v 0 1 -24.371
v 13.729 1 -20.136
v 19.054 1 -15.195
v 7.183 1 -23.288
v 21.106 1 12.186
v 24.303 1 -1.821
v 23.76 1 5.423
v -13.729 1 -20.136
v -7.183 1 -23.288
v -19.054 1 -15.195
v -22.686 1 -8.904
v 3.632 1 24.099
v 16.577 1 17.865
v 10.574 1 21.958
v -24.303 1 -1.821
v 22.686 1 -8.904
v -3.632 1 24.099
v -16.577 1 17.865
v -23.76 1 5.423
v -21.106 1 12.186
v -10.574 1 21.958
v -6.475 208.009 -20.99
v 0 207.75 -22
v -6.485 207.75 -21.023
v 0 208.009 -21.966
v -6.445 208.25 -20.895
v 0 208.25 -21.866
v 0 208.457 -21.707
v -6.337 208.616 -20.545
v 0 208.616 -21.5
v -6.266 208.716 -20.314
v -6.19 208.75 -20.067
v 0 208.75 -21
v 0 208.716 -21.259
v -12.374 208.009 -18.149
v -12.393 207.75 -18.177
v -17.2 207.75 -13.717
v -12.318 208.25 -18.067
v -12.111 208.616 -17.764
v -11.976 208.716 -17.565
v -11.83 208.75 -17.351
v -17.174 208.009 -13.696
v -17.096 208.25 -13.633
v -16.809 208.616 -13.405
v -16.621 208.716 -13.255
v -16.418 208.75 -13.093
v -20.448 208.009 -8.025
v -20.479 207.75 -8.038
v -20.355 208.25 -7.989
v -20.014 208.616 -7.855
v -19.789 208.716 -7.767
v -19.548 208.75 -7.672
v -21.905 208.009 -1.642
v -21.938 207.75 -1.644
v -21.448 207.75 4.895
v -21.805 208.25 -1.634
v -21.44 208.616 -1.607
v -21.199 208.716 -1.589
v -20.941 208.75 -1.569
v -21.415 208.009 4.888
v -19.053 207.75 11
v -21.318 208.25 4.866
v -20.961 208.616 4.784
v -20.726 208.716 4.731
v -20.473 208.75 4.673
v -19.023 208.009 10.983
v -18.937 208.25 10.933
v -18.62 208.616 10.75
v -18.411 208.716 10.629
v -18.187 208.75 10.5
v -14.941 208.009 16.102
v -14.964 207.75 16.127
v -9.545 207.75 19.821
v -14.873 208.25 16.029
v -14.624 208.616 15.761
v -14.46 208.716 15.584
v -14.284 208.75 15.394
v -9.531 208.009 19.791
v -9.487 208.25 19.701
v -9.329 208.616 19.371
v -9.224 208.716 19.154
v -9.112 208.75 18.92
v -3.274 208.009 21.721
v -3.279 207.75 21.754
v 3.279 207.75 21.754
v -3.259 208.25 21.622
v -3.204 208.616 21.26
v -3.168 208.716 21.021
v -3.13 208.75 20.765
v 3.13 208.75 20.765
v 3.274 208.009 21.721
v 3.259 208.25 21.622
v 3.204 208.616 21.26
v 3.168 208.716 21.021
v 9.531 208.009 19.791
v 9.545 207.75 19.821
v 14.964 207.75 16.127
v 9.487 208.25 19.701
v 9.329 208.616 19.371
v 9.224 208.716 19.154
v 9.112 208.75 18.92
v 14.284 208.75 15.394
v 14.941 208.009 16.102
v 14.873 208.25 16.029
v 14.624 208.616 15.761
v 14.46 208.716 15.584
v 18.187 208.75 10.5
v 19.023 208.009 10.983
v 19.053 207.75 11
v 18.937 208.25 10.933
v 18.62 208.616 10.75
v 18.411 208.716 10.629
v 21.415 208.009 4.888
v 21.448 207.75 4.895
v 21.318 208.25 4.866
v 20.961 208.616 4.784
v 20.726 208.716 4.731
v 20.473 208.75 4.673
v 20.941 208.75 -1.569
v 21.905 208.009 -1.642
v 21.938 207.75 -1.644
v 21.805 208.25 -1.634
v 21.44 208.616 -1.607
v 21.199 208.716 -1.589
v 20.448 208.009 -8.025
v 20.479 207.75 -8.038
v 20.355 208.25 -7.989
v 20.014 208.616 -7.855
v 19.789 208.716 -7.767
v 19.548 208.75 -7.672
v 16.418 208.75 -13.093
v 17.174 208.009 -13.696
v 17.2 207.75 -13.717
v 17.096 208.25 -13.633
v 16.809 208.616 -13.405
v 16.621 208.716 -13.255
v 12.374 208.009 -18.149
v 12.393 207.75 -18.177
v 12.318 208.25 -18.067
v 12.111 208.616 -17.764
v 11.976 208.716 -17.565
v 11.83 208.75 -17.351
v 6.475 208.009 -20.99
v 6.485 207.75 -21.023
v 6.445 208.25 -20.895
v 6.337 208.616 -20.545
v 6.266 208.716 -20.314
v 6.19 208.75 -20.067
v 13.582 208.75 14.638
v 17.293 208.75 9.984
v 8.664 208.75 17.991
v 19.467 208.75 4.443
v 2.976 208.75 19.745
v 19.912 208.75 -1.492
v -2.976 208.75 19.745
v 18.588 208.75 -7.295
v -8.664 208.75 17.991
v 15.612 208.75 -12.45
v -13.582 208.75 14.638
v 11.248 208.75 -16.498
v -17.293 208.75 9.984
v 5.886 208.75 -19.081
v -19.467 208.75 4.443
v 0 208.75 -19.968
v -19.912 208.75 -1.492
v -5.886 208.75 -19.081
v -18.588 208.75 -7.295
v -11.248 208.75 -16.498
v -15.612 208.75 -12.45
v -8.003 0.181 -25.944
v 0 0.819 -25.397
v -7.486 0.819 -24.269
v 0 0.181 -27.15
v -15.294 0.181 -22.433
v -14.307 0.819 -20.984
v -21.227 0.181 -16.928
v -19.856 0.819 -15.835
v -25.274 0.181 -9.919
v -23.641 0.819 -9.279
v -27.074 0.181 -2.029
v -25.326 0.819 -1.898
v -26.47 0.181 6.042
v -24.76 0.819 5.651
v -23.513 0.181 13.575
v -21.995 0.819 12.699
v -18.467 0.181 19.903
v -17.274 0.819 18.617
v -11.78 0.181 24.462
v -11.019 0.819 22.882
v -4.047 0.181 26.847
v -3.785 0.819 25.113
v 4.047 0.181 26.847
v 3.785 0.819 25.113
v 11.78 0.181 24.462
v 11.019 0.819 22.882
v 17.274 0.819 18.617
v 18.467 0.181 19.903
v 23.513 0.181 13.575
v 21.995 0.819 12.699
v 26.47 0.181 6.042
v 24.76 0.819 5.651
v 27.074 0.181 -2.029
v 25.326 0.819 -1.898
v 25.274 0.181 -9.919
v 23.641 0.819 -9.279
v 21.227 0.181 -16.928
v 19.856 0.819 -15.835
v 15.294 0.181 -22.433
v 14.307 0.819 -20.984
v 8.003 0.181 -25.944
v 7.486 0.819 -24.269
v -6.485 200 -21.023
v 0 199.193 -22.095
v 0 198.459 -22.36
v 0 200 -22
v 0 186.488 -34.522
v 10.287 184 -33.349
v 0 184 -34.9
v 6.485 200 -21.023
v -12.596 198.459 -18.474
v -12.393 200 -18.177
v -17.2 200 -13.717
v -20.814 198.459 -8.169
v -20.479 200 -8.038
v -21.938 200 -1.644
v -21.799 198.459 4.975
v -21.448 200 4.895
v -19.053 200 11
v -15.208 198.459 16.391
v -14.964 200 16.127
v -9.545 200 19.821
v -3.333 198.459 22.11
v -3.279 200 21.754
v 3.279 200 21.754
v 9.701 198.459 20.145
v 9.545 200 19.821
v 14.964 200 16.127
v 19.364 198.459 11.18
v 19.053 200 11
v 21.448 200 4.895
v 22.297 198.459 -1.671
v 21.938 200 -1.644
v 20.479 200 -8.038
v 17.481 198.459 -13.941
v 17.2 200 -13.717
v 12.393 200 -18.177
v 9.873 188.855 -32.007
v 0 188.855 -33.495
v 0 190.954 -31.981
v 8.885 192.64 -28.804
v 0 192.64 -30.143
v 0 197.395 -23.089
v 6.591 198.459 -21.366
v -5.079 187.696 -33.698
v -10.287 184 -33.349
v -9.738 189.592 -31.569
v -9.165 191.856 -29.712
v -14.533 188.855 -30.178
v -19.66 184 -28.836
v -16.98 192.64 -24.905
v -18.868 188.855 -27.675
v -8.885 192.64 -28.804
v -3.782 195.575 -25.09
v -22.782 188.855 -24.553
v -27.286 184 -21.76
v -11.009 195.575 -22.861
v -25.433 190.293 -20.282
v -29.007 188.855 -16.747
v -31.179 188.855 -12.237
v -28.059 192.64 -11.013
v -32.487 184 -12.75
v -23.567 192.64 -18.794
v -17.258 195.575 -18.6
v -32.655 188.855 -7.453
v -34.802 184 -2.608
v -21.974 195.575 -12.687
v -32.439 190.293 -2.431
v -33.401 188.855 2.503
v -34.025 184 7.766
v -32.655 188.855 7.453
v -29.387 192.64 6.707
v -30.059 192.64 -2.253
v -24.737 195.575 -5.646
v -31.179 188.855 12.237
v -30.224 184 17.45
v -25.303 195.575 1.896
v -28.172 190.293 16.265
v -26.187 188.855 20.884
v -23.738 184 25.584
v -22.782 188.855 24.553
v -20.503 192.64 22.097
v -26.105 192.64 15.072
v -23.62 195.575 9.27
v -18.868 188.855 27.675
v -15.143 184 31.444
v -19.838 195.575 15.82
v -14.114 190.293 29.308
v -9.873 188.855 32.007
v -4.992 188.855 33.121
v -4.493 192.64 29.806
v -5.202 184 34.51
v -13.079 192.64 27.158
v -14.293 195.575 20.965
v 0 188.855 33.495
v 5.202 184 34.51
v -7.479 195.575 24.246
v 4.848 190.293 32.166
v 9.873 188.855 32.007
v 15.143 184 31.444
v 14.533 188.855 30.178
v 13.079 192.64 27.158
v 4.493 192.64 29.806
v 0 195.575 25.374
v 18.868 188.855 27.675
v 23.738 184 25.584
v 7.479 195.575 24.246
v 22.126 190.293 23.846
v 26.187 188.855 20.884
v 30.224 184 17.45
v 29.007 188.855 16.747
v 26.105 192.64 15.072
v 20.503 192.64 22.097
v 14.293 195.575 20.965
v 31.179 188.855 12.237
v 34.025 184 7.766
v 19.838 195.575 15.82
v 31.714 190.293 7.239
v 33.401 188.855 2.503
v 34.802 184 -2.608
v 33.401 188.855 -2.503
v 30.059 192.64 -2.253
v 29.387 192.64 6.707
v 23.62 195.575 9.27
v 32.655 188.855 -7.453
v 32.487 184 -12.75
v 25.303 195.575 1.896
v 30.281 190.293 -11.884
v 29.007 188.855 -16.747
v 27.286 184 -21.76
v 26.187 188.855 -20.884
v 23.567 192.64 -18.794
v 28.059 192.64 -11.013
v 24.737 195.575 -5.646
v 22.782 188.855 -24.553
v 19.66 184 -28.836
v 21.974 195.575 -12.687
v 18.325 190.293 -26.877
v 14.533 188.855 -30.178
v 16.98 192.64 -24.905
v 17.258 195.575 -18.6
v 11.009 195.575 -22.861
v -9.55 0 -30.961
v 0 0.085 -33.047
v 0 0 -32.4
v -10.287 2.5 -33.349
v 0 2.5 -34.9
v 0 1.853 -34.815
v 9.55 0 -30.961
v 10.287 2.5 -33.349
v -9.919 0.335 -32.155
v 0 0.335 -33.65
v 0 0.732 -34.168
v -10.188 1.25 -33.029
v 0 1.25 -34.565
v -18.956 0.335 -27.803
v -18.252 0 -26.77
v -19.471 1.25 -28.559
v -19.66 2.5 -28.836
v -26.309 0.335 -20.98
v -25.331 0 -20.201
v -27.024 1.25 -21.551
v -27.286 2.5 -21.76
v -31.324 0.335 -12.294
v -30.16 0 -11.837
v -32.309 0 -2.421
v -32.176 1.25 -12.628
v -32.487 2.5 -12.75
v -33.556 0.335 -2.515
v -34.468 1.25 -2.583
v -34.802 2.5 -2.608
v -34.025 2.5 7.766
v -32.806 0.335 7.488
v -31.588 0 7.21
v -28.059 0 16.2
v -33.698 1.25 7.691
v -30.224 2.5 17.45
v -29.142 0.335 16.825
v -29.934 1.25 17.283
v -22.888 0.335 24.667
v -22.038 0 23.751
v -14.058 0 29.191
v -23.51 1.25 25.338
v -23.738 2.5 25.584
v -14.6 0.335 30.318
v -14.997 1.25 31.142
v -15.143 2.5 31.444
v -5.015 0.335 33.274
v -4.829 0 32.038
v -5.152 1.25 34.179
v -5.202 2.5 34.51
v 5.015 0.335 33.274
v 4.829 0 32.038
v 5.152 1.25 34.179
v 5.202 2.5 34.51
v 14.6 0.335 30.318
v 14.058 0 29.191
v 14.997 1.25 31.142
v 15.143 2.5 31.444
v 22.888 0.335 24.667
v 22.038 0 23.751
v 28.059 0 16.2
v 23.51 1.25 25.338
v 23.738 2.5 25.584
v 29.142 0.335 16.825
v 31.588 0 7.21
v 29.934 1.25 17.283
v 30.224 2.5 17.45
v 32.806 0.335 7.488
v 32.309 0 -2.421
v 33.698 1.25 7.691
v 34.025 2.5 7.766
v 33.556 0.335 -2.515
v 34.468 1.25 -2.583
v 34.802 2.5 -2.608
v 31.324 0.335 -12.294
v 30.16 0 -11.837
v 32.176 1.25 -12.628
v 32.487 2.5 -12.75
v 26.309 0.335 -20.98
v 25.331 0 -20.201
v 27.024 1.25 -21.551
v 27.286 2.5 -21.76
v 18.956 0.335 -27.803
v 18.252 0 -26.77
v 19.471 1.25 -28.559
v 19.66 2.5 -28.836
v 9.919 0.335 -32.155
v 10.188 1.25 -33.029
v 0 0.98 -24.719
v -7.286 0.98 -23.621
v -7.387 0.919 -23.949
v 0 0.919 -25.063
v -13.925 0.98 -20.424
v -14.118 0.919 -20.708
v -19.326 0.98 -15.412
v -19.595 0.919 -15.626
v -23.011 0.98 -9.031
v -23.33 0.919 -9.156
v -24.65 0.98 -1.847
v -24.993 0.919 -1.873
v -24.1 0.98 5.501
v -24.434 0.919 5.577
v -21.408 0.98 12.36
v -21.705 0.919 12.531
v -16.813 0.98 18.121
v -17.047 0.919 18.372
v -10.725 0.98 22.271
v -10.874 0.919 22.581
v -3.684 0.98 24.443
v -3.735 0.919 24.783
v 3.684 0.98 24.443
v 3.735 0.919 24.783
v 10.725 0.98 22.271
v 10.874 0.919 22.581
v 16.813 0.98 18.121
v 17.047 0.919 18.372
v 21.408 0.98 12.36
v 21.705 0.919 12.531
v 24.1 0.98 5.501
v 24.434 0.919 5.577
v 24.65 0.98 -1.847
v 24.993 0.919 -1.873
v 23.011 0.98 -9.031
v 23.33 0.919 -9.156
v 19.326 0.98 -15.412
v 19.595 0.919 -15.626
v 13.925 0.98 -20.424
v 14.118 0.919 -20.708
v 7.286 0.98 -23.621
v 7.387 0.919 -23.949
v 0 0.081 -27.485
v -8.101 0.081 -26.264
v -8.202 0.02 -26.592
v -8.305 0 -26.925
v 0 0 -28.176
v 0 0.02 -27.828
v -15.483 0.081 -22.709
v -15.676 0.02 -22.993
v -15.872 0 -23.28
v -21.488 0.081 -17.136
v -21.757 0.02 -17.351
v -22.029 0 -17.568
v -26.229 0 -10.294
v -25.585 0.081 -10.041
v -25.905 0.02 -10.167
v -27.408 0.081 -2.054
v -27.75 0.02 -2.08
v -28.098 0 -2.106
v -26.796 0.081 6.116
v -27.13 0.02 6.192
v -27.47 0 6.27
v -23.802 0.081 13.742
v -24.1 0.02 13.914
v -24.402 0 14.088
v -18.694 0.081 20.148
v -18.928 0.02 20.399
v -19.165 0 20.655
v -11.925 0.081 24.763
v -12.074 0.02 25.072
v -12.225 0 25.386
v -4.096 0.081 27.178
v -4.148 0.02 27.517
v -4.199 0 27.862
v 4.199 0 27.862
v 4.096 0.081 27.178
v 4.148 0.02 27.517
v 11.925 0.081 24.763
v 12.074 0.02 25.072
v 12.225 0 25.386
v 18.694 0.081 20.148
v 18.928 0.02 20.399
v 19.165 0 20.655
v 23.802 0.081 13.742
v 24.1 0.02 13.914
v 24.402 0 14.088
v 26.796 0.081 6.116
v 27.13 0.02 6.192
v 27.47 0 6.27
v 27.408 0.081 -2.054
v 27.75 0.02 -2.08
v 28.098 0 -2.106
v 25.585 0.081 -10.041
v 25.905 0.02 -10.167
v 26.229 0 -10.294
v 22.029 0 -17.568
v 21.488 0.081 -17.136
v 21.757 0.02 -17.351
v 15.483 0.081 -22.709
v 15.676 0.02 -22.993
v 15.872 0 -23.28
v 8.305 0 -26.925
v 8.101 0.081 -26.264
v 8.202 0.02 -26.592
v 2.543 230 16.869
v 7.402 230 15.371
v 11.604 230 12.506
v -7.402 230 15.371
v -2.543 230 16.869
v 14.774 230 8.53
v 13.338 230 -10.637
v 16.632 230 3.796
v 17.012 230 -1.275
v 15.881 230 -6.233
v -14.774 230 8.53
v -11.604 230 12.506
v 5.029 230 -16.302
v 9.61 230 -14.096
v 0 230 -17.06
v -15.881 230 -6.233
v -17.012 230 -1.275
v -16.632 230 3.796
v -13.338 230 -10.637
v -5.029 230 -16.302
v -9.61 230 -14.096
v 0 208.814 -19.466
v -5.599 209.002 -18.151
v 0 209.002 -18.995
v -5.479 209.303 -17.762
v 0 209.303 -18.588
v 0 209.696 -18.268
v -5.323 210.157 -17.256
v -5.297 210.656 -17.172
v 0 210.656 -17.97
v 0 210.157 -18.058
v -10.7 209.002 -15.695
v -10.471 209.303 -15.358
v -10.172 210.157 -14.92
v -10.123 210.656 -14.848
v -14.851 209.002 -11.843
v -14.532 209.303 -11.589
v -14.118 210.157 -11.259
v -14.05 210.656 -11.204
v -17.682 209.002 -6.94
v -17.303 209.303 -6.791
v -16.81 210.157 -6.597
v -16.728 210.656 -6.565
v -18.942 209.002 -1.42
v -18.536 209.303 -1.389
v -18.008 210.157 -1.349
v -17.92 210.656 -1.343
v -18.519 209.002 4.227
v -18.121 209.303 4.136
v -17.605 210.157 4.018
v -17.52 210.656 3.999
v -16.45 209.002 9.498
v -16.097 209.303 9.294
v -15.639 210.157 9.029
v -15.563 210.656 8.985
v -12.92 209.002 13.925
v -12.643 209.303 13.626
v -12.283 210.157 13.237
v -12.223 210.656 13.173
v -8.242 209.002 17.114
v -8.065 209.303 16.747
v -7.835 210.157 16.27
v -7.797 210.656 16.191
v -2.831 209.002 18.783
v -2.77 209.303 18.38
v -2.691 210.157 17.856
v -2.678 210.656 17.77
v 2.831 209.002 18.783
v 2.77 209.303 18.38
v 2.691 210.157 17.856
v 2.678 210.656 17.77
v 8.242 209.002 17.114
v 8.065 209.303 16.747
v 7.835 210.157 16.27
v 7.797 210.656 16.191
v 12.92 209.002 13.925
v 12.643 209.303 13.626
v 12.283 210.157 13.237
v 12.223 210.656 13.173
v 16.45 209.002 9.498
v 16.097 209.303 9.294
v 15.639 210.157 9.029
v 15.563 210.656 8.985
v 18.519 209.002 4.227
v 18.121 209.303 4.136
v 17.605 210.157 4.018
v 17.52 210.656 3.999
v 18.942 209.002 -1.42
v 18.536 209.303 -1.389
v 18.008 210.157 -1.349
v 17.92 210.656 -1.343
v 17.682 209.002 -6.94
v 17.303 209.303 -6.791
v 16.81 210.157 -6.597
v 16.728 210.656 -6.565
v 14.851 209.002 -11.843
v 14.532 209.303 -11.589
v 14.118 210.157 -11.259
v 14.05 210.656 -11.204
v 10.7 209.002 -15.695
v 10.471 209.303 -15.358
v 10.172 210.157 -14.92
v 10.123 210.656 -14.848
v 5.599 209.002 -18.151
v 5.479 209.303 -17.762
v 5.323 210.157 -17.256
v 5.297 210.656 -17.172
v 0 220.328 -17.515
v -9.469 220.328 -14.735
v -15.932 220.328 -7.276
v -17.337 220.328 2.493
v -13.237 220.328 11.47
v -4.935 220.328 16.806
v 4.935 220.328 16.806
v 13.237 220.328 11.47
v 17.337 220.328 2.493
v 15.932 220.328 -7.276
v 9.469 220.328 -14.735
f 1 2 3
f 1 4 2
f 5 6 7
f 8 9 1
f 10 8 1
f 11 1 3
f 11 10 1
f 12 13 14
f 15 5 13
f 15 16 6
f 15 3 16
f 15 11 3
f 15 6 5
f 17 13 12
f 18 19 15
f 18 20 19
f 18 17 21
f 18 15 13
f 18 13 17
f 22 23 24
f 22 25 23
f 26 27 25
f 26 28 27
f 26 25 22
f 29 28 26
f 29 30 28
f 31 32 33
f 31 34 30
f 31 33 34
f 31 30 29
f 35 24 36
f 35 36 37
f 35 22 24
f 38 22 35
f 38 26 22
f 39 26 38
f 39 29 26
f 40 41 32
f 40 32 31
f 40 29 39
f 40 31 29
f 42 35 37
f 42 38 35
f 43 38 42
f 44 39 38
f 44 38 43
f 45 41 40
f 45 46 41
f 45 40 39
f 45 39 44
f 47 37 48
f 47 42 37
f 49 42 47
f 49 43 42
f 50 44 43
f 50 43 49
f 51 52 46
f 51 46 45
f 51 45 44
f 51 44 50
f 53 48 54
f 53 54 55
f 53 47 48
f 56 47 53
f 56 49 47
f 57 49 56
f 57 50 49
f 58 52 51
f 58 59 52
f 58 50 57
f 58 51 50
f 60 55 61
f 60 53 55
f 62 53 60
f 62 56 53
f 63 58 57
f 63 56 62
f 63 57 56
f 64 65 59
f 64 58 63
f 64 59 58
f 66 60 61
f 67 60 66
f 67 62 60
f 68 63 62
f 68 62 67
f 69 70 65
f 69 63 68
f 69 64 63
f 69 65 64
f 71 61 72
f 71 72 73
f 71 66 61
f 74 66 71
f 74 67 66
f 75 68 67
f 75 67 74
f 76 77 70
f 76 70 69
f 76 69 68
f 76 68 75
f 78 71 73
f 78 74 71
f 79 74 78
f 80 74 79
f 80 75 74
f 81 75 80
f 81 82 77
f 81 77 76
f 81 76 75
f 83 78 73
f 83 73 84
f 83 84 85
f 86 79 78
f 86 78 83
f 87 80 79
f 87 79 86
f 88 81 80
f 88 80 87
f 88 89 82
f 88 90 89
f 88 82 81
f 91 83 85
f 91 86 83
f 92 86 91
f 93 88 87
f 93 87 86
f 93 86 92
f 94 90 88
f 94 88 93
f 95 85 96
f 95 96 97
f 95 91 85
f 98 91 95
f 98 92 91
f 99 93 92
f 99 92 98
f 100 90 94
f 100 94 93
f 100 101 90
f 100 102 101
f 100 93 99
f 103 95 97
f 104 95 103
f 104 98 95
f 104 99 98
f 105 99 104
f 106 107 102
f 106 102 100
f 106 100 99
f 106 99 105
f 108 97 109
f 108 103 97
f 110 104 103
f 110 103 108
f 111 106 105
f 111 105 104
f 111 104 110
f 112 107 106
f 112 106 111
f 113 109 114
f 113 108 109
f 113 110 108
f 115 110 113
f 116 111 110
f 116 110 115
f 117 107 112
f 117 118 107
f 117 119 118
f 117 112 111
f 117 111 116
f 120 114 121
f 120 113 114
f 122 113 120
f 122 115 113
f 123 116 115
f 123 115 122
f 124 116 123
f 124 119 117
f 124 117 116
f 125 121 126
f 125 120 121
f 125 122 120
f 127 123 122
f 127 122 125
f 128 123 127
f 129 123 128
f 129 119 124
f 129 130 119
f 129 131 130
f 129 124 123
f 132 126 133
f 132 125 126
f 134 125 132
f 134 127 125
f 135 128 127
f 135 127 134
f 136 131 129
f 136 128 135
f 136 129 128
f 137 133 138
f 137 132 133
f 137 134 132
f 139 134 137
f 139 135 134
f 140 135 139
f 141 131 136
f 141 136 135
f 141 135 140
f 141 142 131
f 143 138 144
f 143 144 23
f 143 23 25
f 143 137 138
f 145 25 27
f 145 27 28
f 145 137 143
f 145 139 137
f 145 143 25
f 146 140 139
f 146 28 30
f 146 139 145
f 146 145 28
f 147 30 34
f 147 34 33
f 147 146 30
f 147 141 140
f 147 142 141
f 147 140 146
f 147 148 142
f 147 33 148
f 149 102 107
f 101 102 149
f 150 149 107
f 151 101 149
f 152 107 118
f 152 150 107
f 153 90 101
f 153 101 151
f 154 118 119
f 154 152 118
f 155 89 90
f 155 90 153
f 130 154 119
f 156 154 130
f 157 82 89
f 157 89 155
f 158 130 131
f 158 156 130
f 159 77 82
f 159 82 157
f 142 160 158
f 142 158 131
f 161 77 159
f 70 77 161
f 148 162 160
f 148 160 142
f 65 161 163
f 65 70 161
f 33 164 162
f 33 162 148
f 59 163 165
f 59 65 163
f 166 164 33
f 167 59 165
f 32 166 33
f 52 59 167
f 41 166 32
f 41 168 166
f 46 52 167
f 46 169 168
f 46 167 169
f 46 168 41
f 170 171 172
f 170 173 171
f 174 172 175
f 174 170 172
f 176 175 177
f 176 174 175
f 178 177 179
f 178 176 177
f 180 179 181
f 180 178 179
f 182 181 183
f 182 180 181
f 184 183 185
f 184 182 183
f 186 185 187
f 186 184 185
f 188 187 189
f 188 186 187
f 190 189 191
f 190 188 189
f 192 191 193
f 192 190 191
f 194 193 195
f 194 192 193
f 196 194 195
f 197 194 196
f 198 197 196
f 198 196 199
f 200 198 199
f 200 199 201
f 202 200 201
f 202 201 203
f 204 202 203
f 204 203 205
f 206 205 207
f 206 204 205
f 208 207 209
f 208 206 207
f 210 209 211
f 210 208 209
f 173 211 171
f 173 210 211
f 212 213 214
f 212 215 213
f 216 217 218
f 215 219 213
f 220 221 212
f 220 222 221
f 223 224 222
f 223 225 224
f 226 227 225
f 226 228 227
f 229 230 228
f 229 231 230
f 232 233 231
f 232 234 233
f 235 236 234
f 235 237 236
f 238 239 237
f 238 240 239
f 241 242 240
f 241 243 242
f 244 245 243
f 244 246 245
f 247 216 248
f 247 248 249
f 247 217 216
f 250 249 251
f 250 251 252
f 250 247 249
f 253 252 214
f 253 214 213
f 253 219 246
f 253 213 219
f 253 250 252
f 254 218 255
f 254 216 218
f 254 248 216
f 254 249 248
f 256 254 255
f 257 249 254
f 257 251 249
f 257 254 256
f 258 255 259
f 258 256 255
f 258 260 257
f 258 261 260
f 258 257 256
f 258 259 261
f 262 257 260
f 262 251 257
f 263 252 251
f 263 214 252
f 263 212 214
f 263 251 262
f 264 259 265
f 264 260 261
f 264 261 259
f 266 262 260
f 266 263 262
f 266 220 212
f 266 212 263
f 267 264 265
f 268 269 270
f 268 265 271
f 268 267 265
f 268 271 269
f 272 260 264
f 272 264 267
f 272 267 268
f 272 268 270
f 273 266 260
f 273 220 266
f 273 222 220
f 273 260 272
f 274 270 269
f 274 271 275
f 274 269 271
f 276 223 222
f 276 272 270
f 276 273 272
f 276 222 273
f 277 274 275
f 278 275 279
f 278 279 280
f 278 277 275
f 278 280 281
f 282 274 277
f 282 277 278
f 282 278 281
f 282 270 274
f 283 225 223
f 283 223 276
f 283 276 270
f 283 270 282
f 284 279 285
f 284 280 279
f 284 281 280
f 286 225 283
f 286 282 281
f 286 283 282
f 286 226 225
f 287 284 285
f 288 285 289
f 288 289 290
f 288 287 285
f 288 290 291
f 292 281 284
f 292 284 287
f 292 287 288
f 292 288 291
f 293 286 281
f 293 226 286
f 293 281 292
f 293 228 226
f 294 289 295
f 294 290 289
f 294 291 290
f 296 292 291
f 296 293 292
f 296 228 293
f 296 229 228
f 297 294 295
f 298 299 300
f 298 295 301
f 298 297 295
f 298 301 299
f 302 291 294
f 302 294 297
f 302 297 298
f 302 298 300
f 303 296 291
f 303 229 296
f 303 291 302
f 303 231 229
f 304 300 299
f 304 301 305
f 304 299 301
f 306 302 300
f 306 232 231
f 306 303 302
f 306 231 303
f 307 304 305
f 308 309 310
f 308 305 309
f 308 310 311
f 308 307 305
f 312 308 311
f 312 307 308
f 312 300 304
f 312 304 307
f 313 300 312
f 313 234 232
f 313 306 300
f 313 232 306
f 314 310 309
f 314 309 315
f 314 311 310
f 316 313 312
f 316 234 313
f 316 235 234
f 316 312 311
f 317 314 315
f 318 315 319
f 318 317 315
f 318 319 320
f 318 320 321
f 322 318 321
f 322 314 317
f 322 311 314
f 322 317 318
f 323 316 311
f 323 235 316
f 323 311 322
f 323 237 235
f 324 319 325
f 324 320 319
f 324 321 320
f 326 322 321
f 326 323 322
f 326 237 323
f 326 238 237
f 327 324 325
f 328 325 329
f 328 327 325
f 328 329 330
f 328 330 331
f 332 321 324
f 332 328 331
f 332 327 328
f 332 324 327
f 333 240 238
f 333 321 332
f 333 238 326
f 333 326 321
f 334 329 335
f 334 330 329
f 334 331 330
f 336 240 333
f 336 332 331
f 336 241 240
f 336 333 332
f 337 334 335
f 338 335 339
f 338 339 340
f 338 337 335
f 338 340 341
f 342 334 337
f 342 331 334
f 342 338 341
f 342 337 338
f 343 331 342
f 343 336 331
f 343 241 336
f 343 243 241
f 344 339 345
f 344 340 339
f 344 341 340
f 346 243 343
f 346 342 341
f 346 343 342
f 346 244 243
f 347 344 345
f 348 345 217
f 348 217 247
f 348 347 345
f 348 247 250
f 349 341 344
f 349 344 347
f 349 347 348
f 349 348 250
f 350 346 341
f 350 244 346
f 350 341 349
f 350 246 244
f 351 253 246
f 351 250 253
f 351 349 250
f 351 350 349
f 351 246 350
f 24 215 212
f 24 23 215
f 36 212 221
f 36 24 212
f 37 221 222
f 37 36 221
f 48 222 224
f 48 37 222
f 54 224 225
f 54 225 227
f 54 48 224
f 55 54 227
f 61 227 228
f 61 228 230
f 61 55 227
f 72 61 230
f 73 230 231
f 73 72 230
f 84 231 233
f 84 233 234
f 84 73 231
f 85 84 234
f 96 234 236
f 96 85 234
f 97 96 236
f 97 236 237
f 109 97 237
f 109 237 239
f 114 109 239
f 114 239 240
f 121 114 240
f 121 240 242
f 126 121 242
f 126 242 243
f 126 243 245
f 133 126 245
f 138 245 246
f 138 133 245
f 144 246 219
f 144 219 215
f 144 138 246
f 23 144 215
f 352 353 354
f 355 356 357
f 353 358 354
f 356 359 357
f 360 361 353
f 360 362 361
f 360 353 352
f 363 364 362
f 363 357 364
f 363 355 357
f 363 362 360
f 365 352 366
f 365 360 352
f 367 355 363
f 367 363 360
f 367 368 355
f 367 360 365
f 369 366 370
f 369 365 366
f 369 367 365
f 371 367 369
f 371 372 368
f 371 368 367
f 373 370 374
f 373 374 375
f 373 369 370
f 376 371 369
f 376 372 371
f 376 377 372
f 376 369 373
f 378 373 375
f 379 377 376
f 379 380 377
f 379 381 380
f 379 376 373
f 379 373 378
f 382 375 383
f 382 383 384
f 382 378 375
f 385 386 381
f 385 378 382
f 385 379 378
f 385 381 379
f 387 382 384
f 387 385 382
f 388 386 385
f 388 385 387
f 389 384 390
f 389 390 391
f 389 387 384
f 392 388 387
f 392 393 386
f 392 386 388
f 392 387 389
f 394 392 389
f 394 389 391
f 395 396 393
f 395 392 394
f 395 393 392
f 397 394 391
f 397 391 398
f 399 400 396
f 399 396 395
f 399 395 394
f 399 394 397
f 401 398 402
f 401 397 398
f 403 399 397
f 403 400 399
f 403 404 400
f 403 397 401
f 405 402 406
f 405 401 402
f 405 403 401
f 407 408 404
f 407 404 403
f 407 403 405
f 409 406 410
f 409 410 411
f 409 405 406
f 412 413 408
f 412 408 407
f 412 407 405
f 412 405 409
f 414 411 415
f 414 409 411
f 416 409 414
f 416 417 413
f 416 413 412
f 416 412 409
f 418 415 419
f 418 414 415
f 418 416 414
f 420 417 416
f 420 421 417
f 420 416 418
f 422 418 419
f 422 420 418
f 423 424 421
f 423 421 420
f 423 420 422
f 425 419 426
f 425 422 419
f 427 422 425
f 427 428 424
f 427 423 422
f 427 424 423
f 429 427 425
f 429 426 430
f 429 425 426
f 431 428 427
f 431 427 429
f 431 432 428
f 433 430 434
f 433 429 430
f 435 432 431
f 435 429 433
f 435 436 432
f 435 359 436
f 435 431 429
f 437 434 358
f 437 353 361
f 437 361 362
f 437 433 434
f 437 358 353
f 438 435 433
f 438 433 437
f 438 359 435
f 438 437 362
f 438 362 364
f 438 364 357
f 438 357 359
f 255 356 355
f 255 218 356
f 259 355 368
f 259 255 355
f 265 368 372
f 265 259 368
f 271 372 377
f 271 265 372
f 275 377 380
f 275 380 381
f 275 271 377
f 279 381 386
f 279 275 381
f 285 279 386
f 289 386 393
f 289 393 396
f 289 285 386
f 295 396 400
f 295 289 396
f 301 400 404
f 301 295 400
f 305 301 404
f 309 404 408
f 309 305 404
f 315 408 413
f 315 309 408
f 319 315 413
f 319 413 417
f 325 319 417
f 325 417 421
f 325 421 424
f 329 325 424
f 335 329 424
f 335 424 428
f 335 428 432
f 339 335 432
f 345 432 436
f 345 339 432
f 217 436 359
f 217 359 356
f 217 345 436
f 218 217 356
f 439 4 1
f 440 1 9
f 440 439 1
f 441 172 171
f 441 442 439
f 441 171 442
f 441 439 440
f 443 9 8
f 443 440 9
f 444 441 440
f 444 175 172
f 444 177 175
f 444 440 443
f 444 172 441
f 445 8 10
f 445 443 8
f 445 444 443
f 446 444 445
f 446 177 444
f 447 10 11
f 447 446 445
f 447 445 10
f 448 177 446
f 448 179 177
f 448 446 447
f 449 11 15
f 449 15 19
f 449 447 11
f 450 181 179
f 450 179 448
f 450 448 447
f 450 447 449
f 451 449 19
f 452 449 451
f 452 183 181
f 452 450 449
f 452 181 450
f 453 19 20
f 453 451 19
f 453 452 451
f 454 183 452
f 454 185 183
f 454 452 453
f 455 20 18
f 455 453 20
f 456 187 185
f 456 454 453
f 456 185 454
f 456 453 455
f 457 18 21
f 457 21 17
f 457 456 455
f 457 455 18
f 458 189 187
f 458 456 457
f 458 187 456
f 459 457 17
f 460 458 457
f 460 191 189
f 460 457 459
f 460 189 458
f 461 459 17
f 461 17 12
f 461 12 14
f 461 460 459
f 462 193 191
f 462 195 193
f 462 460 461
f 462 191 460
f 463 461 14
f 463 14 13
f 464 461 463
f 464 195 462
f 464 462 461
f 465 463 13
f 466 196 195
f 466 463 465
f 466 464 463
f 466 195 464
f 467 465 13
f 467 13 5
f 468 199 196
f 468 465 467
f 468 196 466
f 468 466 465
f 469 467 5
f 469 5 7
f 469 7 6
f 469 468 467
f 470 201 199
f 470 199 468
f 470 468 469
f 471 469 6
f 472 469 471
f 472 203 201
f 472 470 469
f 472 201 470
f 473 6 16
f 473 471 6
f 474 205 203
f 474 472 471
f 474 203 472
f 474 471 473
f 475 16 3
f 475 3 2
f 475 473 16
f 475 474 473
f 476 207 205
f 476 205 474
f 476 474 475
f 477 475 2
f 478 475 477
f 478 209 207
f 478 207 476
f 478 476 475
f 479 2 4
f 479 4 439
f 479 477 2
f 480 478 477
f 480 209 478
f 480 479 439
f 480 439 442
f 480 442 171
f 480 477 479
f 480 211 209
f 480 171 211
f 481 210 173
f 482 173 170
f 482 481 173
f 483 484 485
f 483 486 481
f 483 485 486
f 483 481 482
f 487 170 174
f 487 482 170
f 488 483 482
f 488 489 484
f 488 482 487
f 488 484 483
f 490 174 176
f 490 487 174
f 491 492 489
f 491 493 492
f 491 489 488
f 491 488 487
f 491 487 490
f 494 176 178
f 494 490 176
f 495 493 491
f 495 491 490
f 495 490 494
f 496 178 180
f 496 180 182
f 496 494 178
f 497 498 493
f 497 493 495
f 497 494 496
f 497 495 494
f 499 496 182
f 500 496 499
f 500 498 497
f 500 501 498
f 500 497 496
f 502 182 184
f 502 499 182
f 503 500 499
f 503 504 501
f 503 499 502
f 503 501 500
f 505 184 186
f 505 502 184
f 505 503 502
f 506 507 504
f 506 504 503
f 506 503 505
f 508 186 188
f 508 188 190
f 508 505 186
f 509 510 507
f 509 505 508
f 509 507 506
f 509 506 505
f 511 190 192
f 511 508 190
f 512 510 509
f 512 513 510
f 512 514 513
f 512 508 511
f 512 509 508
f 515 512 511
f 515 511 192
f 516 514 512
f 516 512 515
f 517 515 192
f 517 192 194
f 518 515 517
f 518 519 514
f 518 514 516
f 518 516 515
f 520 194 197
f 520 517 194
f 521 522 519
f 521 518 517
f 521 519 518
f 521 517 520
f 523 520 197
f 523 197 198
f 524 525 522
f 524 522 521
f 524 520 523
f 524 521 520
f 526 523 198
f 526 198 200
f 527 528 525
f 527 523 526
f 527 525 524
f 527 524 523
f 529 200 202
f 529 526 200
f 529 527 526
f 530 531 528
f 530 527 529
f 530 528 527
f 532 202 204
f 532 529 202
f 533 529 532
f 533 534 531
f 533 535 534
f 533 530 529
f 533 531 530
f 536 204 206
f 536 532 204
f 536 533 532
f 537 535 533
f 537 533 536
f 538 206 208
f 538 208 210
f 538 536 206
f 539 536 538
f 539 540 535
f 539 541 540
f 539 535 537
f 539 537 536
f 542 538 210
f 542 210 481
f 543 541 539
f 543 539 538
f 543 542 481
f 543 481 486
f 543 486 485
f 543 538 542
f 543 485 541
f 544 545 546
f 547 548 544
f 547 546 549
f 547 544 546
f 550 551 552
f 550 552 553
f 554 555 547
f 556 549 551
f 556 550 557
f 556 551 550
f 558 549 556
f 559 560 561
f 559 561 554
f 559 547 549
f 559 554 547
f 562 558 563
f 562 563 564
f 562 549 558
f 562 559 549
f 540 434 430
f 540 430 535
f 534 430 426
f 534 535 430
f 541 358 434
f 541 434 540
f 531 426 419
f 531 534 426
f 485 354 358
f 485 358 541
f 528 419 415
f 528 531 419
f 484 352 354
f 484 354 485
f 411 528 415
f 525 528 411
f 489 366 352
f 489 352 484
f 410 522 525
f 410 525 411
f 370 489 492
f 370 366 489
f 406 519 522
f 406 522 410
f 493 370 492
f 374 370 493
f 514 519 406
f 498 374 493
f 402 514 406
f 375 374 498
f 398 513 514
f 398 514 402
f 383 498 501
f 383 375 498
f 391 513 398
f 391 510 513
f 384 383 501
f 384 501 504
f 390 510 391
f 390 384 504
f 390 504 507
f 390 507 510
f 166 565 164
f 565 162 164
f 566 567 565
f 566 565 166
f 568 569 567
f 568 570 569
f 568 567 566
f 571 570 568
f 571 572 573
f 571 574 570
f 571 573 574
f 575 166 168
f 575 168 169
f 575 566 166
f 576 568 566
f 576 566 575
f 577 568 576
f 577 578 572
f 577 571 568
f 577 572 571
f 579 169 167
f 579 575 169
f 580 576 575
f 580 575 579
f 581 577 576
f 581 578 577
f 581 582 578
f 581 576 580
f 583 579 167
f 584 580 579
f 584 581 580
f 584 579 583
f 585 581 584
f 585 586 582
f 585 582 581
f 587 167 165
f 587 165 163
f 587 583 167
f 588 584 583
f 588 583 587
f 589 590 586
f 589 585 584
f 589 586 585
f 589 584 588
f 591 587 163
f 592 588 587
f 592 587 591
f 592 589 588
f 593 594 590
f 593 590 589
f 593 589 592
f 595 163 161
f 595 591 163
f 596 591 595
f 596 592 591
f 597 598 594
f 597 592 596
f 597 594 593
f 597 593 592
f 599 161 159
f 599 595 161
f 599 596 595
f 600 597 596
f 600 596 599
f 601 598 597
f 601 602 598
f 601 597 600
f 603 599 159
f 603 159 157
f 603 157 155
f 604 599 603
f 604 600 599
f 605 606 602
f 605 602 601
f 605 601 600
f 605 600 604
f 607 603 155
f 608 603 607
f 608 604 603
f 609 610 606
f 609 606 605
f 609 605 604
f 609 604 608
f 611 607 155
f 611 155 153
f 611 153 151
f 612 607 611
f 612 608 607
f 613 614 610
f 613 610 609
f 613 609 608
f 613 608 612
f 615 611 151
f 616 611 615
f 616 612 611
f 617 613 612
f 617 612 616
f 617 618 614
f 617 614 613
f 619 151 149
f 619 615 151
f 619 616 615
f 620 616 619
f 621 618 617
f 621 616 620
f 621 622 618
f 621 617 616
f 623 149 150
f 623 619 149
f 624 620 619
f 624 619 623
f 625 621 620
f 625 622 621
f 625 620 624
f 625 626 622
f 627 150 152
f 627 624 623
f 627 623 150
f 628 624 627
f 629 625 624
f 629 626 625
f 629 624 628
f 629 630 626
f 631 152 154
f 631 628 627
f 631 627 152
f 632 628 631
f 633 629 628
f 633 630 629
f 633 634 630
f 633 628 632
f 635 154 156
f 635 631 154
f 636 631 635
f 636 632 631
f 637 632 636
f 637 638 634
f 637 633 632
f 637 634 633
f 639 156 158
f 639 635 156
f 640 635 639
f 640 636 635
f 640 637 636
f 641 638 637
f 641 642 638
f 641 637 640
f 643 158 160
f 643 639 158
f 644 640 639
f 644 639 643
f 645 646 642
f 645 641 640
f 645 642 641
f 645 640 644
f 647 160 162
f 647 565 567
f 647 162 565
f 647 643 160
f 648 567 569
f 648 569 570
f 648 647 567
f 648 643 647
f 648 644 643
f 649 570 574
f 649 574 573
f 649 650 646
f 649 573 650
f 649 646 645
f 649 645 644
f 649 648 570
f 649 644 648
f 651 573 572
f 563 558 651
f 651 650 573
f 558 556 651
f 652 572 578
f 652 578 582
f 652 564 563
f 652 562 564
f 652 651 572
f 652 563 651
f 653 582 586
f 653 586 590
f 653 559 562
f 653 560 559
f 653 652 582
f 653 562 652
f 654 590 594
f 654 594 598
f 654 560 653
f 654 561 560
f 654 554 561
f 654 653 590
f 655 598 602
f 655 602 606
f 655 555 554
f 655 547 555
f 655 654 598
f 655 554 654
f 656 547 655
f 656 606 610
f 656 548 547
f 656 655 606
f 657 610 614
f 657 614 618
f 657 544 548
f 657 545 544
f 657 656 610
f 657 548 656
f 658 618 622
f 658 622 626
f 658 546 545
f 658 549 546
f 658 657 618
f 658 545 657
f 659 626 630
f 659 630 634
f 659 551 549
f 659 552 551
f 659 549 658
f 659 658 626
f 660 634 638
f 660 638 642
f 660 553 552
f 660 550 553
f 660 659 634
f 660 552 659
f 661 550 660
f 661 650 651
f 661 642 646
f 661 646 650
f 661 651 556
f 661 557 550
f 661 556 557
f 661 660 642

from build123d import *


with BuildPart() as part:
    # Sketch1 → Revolve1 (revolve)
    with BuildSketch(Plane.XY, mode=Mode.PRIVATE) as revolve1_sk:
        with BuildLine():
            Line((28.176458362, 0), (32.4, 0))
            ThreePointArc((32.4, 0), (34.167766953, 0.732233047), (34.9, 2.5))
            Line((34.9, 2.5), (34.9, 184))
            add(Edge.make_bspline(
                [(34.9, 184), (34.9, 186.989827139), (31.915630123, 192.216128506), (25.82490647, 195.027230742), (22, 197.912231806), (22, 200)],
                knots=[0, 0, 0, 0, 0.423782802, 0.726128109, 1, 1, 1, 1], degree=3))
            Line((22, 200), (22, 207.75))
            ThreePointArc((22, 207.75), (21.707106781, 208.457106781), (21, 208.75))
            Line((21, 208.75), (19.968095661, 208.75))
            ThreePointArc((19.968095661, 208.75), (18.587521001, 209.302929301), (17.970306523, 210.655986393))
            Line((17.970306523, 210.655986393), (17.06, 230))
            Line((17.06, 230), (0, 230))
            Line((0, 230), (0, 1))
            Line((0, 1), (24.371019058, 1))
            ThreePointArc((24.371019058, 1), (24.891963591, 0.954423259), (25.397079488, 0.819077862))
            Line((25.397079488, 0.819077862), (27.150397932, 0.180922138))
            ThreePointArc((27.150397932, 0.180922138), (27.655513829, 0.045576741), (28.176458362, 0))
        make_face()
    revolve(revolve1_sk.sketch.rotate(Axis((0, 0, 0), (0, 1, 0)), 90), axis=Axis((0, 0, 0), (0, 1, 0)))


solid = part.part
